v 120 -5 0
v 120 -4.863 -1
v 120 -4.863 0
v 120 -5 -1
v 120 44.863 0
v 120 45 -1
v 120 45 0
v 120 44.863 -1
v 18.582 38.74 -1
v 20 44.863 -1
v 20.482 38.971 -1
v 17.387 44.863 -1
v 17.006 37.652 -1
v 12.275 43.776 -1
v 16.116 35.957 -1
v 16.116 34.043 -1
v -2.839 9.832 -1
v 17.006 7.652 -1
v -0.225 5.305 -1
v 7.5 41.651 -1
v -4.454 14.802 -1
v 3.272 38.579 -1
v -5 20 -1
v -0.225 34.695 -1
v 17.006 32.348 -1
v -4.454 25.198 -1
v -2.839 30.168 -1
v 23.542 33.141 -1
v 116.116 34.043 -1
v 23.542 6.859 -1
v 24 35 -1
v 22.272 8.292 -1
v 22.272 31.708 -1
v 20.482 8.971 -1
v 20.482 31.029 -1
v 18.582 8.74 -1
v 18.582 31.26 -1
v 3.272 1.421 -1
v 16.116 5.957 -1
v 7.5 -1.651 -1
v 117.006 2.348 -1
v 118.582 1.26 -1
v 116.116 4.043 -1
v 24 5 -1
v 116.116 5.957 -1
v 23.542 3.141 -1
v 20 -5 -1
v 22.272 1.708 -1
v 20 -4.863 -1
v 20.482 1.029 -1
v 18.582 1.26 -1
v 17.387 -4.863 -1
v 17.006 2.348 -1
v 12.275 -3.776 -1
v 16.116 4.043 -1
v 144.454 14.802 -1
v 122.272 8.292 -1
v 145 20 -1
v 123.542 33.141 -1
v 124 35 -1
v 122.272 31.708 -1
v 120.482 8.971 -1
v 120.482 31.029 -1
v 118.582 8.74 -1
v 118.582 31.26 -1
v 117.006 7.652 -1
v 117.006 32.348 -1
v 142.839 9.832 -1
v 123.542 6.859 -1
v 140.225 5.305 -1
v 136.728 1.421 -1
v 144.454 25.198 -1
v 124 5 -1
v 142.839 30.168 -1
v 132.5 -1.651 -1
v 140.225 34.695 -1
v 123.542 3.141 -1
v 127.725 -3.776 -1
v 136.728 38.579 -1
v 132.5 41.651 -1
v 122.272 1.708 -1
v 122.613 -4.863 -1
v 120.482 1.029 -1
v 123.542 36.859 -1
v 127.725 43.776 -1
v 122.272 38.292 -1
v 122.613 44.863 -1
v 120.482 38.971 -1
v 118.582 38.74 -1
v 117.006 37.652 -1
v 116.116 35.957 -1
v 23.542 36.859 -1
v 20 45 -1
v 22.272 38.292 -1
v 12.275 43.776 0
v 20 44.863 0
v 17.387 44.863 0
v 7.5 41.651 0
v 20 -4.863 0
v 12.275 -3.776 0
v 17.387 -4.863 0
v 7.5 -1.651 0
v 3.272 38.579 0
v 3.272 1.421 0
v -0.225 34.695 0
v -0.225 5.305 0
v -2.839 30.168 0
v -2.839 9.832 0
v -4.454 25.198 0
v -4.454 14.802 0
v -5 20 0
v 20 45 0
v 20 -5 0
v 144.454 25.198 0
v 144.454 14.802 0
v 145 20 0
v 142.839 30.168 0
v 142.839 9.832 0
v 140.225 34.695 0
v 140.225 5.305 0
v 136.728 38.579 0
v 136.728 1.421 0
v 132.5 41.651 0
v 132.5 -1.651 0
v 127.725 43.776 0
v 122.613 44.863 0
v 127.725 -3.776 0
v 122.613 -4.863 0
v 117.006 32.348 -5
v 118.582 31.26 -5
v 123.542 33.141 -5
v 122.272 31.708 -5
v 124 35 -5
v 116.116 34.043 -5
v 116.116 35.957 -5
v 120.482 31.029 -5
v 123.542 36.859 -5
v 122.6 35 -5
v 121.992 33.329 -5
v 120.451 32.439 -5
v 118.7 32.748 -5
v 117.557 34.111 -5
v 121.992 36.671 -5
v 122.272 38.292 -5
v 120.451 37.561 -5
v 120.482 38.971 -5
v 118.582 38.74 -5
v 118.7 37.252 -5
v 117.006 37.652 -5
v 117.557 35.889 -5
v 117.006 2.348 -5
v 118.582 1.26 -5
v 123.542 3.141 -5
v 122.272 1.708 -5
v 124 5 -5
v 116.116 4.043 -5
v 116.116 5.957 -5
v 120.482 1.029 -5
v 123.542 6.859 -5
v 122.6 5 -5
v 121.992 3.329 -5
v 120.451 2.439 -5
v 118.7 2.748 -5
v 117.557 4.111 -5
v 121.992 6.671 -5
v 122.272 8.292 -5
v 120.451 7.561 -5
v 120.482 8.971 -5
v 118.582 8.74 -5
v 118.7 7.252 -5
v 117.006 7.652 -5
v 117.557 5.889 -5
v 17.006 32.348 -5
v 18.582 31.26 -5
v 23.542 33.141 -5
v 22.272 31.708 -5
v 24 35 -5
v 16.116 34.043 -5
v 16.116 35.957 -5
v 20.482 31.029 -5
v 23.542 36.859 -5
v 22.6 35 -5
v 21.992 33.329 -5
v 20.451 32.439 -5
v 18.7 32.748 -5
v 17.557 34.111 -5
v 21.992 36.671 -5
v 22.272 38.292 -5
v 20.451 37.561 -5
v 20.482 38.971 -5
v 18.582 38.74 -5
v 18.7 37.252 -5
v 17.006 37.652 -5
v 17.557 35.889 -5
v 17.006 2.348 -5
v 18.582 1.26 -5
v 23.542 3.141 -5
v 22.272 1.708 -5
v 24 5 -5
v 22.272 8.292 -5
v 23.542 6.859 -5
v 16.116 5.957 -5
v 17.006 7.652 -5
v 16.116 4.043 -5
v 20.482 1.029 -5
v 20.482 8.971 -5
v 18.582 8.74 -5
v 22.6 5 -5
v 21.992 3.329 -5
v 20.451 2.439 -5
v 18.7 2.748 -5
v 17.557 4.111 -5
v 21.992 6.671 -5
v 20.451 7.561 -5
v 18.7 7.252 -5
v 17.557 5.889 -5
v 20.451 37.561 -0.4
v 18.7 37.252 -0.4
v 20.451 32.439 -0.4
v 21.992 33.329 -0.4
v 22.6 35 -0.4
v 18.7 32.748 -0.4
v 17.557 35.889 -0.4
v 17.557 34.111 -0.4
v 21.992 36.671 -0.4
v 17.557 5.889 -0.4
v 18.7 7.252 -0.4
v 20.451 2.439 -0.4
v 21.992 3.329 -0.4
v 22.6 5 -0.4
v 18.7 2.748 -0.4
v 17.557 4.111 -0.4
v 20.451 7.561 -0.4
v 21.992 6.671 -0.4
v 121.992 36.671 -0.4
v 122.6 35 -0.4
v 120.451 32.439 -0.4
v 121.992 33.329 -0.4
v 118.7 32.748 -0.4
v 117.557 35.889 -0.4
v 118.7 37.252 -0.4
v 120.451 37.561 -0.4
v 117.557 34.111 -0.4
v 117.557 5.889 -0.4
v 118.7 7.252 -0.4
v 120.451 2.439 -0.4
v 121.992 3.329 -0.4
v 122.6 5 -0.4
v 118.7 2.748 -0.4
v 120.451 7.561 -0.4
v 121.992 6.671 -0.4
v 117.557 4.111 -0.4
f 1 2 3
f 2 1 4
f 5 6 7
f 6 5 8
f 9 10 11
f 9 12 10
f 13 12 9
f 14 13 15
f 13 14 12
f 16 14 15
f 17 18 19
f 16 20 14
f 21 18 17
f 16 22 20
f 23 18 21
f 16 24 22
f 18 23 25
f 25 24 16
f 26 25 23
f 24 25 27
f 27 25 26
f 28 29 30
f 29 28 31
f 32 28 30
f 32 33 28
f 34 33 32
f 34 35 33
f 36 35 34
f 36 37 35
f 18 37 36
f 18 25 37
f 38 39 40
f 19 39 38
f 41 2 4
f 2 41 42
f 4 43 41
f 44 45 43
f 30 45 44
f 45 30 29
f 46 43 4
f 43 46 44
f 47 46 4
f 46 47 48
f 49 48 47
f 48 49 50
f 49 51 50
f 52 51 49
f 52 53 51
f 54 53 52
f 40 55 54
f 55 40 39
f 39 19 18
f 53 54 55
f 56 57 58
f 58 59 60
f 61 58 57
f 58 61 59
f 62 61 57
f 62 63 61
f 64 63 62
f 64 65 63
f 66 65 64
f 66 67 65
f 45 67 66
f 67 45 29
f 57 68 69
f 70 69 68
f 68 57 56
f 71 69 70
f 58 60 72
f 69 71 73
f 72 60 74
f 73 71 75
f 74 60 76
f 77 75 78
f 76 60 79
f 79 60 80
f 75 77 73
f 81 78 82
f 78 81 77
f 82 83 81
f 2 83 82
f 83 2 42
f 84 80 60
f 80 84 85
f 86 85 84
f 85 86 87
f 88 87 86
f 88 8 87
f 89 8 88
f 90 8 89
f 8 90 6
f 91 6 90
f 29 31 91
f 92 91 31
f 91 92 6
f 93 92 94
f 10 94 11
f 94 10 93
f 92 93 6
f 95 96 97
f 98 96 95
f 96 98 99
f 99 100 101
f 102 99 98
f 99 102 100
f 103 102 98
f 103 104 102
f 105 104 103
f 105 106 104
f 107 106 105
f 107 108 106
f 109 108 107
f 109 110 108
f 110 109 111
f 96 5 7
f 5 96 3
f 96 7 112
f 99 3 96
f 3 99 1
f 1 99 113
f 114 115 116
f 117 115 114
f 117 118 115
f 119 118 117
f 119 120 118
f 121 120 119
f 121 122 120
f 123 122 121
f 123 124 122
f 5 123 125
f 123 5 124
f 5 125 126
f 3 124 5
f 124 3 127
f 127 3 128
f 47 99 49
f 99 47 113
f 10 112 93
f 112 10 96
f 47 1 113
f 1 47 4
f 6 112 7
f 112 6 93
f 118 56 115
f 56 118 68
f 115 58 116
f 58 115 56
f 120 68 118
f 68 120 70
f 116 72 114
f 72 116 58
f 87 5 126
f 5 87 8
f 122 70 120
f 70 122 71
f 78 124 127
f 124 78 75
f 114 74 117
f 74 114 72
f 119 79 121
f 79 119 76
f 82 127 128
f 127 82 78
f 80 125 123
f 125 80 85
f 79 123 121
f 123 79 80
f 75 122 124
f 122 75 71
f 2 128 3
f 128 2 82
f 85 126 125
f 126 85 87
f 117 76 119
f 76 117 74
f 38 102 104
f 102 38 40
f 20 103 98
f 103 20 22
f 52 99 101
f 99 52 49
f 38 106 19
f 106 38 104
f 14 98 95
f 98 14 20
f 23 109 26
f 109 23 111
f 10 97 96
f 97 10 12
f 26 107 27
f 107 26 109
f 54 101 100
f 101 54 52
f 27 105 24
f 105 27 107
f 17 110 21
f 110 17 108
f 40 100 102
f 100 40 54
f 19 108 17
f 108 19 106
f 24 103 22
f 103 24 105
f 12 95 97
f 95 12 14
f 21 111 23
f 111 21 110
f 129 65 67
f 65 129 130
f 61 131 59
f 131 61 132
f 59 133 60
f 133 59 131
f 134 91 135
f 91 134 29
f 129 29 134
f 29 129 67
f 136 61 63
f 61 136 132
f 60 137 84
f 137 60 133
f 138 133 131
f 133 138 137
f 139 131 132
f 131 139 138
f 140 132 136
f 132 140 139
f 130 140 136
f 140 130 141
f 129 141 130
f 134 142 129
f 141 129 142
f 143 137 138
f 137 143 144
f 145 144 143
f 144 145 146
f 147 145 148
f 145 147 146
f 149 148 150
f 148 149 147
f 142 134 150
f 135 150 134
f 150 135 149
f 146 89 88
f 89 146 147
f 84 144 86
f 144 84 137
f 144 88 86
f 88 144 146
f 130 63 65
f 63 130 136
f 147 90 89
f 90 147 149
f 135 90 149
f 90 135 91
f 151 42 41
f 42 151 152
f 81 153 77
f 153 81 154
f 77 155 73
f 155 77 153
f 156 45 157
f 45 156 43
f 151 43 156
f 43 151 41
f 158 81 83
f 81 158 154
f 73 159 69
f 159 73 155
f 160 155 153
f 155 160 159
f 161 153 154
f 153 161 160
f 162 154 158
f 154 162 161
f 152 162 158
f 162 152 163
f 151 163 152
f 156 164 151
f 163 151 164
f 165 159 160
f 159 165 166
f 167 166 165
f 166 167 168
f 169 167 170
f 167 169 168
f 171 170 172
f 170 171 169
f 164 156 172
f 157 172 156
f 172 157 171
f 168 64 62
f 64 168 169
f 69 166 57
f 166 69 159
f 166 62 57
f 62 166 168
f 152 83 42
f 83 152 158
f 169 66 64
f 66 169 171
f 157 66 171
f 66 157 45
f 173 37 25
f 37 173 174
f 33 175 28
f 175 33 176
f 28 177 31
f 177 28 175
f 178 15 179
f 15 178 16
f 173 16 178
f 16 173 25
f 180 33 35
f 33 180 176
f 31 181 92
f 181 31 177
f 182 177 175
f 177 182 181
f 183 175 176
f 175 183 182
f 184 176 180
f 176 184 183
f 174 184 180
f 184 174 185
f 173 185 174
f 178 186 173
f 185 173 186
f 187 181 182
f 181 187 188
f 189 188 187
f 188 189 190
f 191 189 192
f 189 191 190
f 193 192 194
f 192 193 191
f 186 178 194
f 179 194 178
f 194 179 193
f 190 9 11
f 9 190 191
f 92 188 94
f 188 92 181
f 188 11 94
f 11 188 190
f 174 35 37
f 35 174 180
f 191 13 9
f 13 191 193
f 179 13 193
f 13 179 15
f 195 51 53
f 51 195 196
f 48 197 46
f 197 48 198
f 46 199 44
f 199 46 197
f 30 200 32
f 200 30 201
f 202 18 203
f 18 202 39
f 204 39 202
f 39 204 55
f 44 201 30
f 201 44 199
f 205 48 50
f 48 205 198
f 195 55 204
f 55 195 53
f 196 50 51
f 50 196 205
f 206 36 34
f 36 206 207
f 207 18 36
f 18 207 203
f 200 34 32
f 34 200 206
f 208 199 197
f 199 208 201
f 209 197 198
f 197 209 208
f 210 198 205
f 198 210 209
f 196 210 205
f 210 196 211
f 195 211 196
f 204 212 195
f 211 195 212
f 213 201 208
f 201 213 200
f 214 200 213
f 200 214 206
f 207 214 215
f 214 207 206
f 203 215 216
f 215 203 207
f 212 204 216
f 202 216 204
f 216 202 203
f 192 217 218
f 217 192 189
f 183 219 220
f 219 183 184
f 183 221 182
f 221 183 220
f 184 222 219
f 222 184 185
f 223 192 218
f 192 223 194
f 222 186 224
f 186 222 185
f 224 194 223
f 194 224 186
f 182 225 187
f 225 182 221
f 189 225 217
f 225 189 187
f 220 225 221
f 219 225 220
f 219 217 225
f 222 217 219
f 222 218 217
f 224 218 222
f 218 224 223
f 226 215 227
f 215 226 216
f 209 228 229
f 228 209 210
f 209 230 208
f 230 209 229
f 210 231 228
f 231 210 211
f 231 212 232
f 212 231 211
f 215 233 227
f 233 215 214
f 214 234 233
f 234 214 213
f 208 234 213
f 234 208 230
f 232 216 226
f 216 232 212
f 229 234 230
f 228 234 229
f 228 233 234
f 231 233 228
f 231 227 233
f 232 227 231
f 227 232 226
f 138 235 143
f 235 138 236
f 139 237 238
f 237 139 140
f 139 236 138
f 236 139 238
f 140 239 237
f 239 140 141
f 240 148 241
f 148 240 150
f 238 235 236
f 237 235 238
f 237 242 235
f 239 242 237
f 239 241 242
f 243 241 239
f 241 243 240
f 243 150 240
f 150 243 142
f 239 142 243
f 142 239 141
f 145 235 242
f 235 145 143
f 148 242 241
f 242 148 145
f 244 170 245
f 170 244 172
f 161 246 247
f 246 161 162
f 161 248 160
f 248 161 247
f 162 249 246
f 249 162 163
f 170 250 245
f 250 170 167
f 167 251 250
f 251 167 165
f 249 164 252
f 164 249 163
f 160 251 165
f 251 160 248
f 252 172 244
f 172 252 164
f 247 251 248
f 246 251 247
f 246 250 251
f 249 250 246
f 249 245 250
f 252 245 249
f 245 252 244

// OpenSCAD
 rotate([0,900,180]) translate([20,-45,0])
difference(){  
 union(){  

  cube([100,50,1]);
   translate([100,25,0]) cylinder(1,25,25);
    translate([0,25,0]) cylinder(1,25,25);
  
  translate([100,10,0]) cylinder(5,4,4);
  translate([100,40,0]) cylinder(5,4,4);
  translate([0,10,0]) cylinder(5,4,4);
  translate([0,40,0]) cylinder(5,4,4);
}
  

  #translate([0,10,0.4]) cylinder(5,2.6,2.6);
  #translate([0,40,0.4]) cylinder(5,2.6,2.6);
  #translate([100,10,0.4]) cylinder(5,2.6,2.6);
  #translate([100,40,0.4]) cylinder(5,2.6,2.6);
 
}
